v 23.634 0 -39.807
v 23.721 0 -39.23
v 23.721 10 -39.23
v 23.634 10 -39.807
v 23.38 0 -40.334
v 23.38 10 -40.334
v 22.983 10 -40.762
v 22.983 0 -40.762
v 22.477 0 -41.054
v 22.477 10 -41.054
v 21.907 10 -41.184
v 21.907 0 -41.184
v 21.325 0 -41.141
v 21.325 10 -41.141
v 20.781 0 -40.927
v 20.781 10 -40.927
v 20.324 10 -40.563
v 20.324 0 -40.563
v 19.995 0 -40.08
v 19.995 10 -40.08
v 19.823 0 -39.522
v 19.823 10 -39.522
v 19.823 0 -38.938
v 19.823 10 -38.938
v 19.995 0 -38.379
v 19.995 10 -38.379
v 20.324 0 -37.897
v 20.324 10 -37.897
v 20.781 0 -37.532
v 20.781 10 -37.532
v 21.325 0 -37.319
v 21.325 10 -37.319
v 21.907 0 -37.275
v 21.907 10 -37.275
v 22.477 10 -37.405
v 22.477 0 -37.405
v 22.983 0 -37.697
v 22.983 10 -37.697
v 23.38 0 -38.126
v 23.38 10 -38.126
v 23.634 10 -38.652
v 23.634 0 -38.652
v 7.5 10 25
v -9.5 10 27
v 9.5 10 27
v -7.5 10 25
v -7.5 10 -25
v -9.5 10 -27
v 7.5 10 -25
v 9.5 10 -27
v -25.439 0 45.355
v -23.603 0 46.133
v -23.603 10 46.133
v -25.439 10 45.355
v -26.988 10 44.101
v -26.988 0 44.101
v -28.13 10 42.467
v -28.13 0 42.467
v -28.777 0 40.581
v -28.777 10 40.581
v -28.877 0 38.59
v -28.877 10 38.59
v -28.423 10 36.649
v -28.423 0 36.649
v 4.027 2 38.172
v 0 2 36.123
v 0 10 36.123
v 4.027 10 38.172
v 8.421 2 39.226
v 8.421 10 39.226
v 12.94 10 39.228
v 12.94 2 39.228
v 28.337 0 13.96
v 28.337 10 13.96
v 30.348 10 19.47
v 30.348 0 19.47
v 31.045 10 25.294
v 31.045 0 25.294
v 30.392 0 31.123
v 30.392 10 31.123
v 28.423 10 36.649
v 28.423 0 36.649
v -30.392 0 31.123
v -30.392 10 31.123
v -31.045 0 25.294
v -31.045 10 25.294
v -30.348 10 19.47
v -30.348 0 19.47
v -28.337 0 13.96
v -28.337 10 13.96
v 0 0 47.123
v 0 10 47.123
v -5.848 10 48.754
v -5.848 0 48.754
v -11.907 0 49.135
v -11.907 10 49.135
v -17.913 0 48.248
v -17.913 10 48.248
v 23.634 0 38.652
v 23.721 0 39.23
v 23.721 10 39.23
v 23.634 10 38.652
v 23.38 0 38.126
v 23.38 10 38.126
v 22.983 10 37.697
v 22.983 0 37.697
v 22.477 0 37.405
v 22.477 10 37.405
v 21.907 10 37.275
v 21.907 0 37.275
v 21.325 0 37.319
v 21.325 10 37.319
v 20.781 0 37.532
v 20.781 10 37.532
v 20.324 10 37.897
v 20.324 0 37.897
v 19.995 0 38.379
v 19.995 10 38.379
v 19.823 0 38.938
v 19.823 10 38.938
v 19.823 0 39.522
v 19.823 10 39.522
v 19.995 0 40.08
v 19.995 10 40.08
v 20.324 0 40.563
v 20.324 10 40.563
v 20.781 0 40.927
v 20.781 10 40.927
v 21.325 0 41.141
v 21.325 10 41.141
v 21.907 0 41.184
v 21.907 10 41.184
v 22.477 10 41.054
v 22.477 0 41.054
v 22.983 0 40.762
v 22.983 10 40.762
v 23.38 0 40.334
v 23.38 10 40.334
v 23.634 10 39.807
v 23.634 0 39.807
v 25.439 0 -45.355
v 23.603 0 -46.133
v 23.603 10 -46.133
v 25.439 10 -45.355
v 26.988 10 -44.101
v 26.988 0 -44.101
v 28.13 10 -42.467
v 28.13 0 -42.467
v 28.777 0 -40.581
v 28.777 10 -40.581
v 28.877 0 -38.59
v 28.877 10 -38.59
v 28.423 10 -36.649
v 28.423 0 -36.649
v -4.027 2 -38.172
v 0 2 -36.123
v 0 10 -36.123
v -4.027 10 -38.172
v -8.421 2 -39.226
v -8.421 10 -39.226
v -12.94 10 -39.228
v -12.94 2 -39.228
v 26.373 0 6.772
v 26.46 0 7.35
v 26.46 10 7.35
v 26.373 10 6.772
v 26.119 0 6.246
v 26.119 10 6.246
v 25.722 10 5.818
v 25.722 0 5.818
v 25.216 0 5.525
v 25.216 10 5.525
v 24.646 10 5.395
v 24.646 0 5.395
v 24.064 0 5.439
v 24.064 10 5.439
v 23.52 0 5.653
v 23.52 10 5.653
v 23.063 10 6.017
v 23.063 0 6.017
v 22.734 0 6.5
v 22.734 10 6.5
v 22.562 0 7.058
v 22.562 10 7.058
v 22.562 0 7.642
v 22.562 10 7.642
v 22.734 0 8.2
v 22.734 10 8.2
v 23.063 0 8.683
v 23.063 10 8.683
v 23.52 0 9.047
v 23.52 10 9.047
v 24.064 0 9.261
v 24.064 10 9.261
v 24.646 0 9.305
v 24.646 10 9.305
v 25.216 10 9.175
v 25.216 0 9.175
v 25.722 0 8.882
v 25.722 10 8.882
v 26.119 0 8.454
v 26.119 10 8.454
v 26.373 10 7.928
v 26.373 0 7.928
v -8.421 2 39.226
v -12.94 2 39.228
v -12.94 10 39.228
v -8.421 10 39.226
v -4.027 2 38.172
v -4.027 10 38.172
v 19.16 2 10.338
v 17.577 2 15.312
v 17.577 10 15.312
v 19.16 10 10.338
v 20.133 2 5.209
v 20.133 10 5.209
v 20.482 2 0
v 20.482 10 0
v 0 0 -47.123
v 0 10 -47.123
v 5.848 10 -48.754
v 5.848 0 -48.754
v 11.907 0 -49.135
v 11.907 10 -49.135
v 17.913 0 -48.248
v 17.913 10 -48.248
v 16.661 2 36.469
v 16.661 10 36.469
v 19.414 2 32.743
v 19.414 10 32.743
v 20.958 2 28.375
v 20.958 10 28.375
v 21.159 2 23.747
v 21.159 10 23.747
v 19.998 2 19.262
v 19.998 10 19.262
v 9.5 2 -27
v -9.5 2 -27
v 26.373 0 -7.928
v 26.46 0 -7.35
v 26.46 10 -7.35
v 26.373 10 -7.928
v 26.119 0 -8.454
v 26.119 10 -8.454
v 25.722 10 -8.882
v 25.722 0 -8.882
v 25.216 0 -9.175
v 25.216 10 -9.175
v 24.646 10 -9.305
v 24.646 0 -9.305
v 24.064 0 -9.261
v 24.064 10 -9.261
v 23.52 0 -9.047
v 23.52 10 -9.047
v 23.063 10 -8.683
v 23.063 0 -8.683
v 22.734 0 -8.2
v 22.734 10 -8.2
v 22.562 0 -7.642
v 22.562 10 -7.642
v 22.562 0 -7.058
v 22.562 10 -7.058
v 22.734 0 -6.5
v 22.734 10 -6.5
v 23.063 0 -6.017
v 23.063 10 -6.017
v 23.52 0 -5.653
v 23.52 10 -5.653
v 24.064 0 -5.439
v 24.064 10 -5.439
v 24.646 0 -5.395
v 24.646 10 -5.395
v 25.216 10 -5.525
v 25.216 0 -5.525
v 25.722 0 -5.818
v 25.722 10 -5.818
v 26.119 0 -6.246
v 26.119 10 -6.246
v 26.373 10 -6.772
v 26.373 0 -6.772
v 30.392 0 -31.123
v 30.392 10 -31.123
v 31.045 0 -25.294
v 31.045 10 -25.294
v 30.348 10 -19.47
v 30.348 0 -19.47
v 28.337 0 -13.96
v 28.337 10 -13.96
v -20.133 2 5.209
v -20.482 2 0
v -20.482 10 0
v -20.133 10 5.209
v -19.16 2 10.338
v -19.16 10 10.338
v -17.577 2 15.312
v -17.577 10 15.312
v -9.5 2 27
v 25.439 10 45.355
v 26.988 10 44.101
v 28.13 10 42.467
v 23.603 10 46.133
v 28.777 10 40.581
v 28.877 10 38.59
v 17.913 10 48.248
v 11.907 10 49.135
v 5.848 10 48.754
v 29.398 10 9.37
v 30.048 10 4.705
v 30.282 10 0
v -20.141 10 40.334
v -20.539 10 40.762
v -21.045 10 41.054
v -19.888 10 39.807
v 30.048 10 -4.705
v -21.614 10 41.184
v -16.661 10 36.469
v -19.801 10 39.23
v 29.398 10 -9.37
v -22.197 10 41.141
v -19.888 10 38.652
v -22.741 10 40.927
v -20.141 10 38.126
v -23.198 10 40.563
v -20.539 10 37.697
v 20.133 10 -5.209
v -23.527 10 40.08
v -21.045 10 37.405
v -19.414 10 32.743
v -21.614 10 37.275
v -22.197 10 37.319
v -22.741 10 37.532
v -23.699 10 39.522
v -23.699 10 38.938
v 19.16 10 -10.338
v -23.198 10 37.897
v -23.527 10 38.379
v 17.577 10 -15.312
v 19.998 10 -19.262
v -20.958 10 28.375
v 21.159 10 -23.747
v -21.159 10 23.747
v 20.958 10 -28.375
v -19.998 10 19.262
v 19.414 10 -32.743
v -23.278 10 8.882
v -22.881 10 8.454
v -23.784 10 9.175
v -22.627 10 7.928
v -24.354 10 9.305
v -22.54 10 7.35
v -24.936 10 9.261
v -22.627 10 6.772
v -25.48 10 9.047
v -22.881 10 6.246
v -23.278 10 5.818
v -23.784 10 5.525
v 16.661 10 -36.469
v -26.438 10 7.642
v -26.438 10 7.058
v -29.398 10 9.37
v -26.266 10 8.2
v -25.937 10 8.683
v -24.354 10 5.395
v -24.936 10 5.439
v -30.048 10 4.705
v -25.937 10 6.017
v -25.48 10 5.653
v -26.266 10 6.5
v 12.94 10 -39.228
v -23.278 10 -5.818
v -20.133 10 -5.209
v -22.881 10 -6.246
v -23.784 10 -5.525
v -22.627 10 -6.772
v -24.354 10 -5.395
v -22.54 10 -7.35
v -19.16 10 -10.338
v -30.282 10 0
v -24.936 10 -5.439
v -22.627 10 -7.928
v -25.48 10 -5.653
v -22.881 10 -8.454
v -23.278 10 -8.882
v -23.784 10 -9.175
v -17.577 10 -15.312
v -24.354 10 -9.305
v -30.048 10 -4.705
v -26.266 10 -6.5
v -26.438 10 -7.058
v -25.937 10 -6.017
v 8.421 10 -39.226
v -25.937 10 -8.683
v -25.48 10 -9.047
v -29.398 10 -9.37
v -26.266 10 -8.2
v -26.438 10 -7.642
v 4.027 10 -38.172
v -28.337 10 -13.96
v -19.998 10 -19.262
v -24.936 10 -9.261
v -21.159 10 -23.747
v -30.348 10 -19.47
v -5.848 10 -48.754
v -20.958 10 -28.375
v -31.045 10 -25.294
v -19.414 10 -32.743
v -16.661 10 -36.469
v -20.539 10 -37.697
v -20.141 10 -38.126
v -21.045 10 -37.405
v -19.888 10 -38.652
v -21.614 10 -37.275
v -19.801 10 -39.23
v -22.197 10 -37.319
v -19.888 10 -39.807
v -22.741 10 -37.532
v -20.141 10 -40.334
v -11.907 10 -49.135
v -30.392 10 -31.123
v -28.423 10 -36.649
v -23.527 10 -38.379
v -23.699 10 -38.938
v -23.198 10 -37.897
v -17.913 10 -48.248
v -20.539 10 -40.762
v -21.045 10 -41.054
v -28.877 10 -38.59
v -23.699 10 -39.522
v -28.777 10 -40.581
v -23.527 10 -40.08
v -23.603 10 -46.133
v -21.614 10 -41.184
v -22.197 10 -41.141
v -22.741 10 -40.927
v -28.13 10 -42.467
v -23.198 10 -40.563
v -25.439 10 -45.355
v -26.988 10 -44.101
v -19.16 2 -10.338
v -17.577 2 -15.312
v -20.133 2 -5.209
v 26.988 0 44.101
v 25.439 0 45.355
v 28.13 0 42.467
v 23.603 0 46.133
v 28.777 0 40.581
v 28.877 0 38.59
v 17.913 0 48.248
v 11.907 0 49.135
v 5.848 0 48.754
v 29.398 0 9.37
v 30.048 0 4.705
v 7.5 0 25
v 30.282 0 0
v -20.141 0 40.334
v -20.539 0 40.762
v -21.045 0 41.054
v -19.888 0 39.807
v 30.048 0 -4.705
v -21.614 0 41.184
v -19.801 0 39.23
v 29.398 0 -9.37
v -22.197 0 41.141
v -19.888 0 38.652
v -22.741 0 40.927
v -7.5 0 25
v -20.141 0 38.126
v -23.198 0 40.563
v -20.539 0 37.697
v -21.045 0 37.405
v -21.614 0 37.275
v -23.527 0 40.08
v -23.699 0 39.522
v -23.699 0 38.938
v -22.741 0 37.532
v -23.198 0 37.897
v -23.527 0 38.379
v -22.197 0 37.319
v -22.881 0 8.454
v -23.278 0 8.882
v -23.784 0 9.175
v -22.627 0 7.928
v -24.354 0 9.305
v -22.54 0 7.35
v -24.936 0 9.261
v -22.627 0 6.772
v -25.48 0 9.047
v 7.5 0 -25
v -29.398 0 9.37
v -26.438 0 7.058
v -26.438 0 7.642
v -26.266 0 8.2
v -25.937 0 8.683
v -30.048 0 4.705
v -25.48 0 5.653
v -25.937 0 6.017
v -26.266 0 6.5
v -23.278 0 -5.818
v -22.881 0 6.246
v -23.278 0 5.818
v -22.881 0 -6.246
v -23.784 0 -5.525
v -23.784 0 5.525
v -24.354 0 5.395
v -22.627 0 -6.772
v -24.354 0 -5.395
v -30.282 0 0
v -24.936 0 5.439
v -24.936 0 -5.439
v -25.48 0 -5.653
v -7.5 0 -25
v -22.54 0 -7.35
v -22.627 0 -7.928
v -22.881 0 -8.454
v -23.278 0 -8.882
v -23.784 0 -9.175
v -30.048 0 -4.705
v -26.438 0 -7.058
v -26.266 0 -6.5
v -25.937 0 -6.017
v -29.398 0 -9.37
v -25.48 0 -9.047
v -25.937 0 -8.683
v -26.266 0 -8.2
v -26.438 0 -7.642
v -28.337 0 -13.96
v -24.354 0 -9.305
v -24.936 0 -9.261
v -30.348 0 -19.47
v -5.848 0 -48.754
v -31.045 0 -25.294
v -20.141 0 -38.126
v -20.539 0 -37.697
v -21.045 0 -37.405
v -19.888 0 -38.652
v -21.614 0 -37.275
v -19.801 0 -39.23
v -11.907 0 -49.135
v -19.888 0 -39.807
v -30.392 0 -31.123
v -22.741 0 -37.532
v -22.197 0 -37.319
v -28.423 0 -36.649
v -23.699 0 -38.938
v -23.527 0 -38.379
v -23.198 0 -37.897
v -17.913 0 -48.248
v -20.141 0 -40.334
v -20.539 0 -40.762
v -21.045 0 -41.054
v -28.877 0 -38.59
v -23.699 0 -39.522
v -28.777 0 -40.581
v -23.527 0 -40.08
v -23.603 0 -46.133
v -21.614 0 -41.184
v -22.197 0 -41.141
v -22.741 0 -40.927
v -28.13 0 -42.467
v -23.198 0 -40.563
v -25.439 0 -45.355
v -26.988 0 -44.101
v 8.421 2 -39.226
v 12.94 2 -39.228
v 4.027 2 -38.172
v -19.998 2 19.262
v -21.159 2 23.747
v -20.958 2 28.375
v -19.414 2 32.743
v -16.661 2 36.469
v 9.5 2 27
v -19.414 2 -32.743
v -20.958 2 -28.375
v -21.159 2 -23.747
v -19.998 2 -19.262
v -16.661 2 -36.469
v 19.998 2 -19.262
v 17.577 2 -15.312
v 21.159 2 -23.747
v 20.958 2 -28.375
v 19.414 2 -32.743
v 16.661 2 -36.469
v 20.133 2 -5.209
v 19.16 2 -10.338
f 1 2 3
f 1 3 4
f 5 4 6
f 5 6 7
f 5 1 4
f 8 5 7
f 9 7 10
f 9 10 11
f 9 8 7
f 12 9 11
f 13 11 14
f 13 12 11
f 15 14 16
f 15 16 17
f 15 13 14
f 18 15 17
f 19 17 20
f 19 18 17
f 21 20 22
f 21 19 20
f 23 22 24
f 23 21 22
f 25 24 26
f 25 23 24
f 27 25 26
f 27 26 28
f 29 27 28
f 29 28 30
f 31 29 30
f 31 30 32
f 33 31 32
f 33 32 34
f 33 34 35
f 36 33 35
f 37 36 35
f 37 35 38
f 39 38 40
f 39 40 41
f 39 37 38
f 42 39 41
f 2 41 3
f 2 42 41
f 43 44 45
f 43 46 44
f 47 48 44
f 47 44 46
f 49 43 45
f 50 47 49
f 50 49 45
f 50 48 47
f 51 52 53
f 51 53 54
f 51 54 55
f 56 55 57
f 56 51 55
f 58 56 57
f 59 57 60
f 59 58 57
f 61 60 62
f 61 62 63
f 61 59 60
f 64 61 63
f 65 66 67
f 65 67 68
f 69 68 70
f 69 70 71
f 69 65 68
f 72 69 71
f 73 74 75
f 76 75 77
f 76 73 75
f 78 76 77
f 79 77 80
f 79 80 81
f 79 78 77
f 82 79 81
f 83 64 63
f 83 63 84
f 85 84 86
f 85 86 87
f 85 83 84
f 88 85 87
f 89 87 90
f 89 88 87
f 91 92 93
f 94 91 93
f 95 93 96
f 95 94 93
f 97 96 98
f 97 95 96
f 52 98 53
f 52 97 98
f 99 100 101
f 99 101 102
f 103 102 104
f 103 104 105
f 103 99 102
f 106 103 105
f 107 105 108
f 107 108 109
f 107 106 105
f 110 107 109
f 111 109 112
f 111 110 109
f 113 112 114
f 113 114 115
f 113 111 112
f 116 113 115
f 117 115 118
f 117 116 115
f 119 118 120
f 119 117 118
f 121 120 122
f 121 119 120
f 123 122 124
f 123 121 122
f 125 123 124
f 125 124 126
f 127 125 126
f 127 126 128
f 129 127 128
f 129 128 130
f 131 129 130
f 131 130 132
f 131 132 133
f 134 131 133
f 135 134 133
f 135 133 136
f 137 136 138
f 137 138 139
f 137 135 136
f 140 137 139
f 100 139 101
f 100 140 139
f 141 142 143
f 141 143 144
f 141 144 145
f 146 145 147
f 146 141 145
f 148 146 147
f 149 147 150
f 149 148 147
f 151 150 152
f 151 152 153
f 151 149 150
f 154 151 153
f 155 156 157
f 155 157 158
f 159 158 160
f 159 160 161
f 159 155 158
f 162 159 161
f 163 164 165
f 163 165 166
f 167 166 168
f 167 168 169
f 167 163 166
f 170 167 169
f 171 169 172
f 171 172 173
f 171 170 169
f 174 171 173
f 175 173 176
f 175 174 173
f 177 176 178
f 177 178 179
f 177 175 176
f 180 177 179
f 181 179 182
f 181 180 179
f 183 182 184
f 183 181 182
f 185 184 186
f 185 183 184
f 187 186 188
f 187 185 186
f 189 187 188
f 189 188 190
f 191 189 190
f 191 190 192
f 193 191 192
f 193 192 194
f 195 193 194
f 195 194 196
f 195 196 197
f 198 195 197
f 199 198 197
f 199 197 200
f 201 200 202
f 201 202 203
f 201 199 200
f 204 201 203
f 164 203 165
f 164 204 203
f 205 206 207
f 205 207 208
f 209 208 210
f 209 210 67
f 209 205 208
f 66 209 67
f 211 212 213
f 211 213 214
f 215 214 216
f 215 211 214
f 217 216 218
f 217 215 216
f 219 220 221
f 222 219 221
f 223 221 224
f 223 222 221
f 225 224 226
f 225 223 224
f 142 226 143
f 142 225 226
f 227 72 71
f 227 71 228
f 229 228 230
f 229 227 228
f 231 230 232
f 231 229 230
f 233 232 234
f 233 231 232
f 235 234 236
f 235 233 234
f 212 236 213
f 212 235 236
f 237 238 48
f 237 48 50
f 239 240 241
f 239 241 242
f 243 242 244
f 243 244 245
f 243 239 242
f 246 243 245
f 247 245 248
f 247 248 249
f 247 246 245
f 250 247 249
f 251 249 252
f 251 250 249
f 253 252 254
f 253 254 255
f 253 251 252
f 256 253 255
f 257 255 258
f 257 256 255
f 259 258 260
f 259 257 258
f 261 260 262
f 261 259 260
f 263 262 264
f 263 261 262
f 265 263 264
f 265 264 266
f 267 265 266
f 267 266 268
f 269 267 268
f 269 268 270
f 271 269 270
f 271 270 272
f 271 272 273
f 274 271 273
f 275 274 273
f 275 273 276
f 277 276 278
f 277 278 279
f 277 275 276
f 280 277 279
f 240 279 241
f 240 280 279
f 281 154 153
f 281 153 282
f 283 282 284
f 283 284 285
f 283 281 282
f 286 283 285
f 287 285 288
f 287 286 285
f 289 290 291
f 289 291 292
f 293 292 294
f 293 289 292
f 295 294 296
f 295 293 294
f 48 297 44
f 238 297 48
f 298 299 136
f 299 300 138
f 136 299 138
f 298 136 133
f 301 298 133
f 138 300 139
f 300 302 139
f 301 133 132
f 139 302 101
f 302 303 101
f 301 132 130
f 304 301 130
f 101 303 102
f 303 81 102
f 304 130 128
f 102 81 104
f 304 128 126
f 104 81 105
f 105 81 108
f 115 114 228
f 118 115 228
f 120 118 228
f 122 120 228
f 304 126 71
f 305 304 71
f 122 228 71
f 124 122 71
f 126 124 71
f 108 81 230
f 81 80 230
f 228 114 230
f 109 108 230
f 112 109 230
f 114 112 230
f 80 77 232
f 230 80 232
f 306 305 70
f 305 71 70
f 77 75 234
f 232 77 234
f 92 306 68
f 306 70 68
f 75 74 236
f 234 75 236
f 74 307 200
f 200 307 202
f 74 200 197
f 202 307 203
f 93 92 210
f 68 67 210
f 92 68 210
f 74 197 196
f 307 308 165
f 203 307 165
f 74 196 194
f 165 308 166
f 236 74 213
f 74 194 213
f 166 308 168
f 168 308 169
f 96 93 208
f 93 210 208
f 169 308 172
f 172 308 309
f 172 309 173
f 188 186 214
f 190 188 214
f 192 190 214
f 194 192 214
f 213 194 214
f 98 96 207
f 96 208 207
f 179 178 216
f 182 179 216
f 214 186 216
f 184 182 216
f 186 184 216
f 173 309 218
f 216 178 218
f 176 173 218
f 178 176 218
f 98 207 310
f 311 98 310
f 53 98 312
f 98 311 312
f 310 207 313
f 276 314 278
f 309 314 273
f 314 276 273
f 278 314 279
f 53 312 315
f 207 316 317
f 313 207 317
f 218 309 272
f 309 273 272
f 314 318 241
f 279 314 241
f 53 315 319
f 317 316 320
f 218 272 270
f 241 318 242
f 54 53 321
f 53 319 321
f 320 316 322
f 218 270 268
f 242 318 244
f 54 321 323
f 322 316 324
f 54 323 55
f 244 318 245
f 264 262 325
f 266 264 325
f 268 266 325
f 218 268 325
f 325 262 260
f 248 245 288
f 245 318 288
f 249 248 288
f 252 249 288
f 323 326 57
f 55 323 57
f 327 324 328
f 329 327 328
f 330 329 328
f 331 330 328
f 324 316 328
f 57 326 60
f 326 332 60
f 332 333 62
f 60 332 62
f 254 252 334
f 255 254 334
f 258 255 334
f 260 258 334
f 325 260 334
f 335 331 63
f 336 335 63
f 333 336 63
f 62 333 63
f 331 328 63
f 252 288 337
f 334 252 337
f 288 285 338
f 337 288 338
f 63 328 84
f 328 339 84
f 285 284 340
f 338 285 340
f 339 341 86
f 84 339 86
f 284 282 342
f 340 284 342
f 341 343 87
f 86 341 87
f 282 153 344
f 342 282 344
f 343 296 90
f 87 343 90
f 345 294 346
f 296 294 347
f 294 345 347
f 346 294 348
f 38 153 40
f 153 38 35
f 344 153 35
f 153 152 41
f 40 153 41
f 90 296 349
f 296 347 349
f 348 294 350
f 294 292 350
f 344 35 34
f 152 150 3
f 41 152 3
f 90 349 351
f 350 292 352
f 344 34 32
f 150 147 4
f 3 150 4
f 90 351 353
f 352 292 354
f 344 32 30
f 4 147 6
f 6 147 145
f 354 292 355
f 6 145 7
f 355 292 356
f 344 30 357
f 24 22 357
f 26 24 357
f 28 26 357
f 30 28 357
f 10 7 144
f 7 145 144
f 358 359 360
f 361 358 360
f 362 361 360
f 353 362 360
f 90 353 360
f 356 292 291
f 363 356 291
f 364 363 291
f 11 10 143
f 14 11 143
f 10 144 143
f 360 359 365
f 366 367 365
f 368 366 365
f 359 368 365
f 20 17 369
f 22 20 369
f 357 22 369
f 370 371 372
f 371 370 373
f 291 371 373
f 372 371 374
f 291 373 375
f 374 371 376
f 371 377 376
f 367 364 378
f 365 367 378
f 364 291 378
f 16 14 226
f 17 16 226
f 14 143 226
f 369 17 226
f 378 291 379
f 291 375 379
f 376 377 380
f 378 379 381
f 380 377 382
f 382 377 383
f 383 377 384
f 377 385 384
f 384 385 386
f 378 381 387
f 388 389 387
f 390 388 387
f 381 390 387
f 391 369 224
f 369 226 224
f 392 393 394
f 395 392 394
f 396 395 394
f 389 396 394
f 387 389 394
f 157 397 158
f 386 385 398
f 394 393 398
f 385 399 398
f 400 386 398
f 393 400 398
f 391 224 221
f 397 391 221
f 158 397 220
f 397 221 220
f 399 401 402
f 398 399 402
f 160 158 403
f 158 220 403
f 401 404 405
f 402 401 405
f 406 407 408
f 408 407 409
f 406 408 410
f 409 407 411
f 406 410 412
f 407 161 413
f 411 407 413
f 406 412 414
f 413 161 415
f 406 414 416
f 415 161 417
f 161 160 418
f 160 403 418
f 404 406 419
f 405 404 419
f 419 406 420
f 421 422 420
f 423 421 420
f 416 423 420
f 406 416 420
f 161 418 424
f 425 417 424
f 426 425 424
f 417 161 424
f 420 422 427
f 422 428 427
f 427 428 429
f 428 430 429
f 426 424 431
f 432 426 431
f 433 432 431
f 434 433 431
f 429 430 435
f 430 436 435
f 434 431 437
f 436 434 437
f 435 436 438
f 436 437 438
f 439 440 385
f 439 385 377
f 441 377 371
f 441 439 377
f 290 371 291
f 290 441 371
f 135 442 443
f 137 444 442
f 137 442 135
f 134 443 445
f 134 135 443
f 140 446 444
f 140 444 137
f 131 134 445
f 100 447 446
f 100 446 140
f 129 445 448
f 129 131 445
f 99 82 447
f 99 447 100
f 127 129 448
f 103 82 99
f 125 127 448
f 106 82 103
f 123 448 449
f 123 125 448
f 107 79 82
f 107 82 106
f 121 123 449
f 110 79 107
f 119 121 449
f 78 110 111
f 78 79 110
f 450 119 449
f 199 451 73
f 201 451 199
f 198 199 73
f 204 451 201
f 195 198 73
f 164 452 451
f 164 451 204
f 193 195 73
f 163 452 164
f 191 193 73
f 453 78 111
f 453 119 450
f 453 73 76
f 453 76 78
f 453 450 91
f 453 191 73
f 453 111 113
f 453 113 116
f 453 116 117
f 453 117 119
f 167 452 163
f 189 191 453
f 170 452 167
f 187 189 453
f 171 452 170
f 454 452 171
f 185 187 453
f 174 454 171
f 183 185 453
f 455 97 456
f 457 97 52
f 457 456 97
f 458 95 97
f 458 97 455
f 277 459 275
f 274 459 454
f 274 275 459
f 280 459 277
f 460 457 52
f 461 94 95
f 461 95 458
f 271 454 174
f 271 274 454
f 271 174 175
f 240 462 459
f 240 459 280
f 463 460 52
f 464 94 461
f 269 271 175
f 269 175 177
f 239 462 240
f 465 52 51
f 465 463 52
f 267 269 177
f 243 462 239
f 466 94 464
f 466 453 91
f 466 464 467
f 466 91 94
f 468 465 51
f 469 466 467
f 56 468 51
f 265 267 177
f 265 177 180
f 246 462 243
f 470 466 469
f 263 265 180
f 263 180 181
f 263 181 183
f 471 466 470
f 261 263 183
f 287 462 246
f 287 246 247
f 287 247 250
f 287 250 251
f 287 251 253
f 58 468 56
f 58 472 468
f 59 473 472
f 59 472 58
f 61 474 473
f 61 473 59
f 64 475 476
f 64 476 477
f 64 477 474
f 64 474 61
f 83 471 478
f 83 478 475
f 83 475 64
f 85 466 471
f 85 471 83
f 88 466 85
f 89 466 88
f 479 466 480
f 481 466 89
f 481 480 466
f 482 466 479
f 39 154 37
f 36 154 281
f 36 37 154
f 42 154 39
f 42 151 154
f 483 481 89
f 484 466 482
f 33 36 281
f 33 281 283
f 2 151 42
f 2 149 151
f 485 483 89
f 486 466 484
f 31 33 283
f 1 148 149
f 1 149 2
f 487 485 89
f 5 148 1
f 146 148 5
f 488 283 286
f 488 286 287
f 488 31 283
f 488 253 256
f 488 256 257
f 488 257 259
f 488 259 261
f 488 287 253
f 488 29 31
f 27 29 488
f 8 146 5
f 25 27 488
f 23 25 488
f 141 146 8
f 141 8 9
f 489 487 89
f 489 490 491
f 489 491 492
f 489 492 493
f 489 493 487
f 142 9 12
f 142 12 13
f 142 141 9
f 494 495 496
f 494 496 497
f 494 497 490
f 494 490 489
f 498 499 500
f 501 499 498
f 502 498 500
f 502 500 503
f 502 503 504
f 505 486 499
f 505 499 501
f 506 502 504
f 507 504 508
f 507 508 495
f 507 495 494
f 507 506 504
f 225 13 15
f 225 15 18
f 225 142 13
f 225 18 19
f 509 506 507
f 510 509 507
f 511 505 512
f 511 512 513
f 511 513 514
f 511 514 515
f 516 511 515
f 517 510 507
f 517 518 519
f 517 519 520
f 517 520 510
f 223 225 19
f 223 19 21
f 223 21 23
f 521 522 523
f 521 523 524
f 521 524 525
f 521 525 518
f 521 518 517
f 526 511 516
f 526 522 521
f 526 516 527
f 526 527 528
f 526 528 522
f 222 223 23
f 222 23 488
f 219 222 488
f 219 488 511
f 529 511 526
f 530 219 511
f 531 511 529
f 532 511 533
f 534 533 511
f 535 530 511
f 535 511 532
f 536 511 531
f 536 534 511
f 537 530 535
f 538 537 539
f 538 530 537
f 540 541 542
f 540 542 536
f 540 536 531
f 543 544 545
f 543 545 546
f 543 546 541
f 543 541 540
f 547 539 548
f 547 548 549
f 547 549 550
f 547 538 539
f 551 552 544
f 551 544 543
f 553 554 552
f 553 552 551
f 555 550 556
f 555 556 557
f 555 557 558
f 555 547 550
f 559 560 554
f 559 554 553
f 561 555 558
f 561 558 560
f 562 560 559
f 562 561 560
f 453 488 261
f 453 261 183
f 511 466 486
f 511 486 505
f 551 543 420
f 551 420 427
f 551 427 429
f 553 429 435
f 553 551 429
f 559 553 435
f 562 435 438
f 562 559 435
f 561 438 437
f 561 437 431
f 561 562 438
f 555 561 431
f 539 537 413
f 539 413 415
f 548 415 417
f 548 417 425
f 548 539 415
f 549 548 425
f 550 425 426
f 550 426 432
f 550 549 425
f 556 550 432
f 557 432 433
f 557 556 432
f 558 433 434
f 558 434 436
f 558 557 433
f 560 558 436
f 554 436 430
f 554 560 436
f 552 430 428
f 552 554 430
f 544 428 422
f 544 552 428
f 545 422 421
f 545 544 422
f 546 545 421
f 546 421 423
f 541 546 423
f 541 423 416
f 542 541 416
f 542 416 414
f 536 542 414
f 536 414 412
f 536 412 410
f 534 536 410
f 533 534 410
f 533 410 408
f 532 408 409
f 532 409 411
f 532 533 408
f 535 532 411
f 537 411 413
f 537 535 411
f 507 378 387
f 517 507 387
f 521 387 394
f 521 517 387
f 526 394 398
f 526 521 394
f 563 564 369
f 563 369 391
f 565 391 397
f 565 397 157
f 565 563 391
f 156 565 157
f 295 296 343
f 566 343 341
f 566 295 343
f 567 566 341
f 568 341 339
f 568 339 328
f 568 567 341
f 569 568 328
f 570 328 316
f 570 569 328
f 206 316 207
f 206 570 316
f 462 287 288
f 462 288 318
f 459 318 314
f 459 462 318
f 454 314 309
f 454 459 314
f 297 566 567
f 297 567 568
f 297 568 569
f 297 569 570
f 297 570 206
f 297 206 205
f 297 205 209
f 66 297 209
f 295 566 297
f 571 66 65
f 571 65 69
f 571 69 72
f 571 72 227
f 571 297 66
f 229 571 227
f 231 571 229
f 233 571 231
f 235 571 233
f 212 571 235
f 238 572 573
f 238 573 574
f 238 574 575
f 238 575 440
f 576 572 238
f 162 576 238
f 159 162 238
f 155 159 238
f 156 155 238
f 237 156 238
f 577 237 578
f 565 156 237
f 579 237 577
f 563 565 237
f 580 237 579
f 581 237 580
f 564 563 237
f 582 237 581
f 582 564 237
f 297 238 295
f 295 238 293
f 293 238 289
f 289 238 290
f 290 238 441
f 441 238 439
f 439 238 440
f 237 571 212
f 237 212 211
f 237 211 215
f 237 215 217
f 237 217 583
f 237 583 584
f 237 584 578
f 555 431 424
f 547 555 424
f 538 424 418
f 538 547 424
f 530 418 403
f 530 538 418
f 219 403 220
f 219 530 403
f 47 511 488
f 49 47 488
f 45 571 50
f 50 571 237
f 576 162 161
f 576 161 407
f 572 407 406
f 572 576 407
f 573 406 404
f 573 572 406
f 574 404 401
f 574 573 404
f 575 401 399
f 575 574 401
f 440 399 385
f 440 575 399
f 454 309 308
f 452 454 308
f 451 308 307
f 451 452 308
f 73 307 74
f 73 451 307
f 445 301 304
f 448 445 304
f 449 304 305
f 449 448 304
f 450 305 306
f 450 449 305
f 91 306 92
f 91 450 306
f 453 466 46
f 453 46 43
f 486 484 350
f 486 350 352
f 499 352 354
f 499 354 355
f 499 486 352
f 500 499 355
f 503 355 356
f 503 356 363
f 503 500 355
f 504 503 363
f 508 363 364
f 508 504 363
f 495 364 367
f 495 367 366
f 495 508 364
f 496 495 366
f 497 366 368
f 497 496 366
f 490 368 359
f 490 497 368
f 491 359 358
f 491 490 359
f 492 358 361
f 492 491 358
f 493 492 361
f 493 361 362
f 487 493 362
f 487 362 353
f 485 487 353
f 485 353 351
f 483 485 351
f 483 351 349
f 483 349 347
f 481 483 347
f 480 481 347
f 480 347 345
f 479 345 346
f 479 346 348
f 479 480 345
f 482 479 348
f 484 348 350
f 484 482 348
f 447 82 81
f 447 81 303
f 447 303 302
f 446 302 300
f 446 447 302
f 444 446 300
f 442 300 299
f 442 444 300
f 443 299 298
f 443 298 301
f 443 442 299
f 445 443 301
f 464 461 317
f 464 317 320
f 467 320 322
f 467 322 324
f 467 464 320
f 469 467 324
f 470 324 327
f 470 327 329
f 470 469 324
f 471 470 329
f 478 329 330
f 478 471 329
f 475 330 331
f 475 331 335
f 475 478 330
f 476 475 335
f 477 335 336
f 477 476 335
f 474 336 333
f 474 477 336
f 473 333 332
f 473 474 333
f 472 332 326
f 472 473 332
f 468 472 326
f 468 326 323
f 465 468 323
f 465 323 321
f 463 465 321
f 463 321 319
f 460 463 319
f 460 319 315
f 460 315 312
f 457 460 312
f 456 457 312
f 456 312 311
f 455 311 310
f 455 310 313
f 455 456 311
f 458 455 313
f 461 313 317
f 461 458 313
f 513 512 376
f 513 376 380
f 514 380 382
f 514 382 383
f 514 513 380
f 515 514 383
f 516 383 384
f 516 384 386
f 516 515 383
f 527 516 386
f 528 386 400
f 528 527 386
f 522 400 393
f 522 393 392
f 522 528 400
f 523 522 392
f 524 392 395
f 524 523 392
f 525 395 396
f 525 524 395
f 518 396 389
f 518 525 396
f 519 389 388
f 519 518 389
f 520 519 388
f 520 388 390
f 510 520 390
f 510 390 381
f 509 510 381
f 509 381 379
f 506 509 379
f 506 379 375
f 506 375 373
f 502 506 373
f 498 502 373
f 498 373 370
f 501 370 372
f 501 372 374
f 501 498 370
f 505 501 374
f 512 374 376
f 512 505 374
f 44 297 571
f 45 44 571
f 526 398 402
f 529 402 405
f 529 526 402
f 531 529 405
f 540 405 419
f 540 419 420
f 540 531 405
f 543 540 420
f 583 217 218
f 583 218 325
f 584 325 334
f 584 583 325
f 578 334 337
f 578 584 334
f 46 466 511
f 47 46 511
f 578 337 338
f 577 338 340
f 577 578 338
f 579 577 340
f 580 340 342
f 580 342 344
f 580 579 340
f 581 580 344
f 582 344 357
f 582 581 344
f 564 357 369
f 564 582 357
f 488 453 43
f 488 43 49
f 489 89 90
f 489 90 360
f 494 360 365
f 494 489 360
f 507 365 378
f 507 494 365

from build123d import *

# Parameters (mm, degrees)
SKETCH1_W           = 19
SKETCH1_H           = 54
BOSS_EXTRUDE4_DEPTH = 2
SKETCH1_8_R         = 1.96
SKETCH1_8_W         = 19
SKETCH1_8_H         = 54
SKETCH1_8_W_2       = 15
SKETCH1_8_H_2       = 50
BOSS_EXTRUDE7_DEPTH = 10


with BuildPart() as part:
    # Sketch1 → Boss-Extrude4 (new body)
    with BuildSketch(Plane(origin=(0, 0, 0), x_dir=(1, 0, 0), z_dir=(0, 1, 0))):
        with BuildLine():
            ThreePointArc((0, 36.123062219), (-6.193274653, 38.828364827), (-12.939793146, 39.228116436))
            ThreePointArc((-12.939793146, 39.228116436), (-20.958488329, 28.375411428), (-17.576524537, 15.31237199))
            ThreePointArc((-17.576524537, 15.31237199), (-19.723741965, 7.787946982), (-20.482290695, 0))
            ThreePointArc((-20.482290695, 0), (-19.723741965, -7.787946982), (-17.576524537, -15.31237199))
            ThreePointArc((-17.576524537, -15.31237199), (-20.958488329, -28.375411428), (-12.939793146, -39.228116436))
            ThreePointArc((-12.939793146, -39.228116436), (-6.193274653, -38.828364827), (0, -36.123062219))
            ThreePointArc((0, -36.123062219), (6.193274653, -38.828364827), (12.939793146, -39.228116436))
            ThreePointArc((12.939793146, -39.228116436), (20.958488329, -28.375411428), (17.576524537, -15.31237199))
            ThreePointArc((17.576524537, -15.31237199), (19.723741965, -7.787946982), (20.482290695, 0))
            ThreePointArc((20.482290695, 0), (19.723741965, 7.787946982), (17.576524537, 15.31237199))
            ThreePointArc((17.576524537, 15.31237199), (20.958488329, 28.375411428), (12.939793146, 39.228116436))
            ThreePointArc((12.939793146, 39.228116436), (6.193274653, 38.828364827), (0, 36.123062219))
        make_face()
        Rectangle(SKETCH1_W, SKETCH1_H, mode=Mode.SUBTRACT)
    extrude(amount=BOSS_EXTRUDE4_DEPTH)

    # Sketch1<8> → Boss-Extrude7 (add)
    # profile 1 of 2: a face of its own
    with BuildSketch(Plane(origin=(0, 0, 0), x_dir=(1, 0, 0), z_dir=(0, 1, 0))):
        with BuildLine():
            ThreePointArc((23.603104913, 46.133139939), (11.906709568, 49.134588213), (0, 47.123463385))
            ThreePointArc((0, 47.123463385), (-11.906709568, 49.134588213), (-23.603104913, 46.133139939))
            ThreePointArc((-23.603104913, 46.133139939), (-28.130450168, 42.466846104), (-28.423306673, 36.648530145))
            ThreePointArc((-28.423306673, 36.648530145), (-31.044925166, 25.293928807), (-28.336730948, 13.959664864))
            ThreePointArc((-28.336730948, 13.959664864), (-29.774673681, 7.044655791), (-30.282467524, 0))
            ThreePointArc((-30.282467524, 0), (-29.774673681, -7.044655791), (-28.336730948, -13.959664864))
            ThreePointArc((-28.336730948, -13.959664864), (-31.044925166, -25.293928807), (-28.423306673, -36.648530145))
            ThreePointArc((-28.423306673, -36.648530145), (-28.130450168, -42.466846104), (-23.603104913, -46.133139939))
            ThreePointArc((-23.603104913, -46.133139939), (-11.906709568, -49.134588213), (0, -47.123463385))
            ThreePointArc((0, -47.123463385), (11.906709568, -49.134588213), (23.603104913, -46.133139939))
            ThreePointArc((23.603104913, -46.133139939), (28.130450168, -42.466846104), (28.423306673, -36.648530145))
            ThreePointArc((28.423306673, -36.648530145), (31.044925166, -25.293928807), (28.336730948, -13.959664864))
            ThreePointArc((28.336730948, -13.959664864), (29.774673681, -7.044655791), (30.282467524, 0))
            ThreePointArc((30.282467524, 0), (29.774673681, 7.044655791), (28.336730948, 13.959664864))
            ThreePointArc((28.336730948, 13.959664864), (31.044925166, 25.293928807), (28.423306673, 36.648530145))
            ThreePointArc((28.423306673, 36.648530145), (28.130450168, 42.466846104), (23.603104913, 46.133139939))
        make_face()
        with Locations((-21.760807675, -39.229711143)):
            Circle(SKETCH1_8_R, mode=Mode.SUBTRACT)
        with Locations((-24.5, -7.35)):
            Circle(SKETCH1_8_R, mode=Mode.SUBTRACT)
        with BuildLine():
            ThreePointArc((-17.576524537, 15.31237199), (-20.958488329, 28.375411428), (-12.939793146, 39.228116436))
            ThreePointArc((-12.939793146, 39.228116436), (-6.193274653, 38.828364827), (0, 36.123062219))
            ThreePointArc((0, 36.123062219), (6.193274653, 38.828364827), (12.939793146, 39.228116436))
            ThreePointArc((12.939793146, 39.228116436), (20.958488329, 28.375411428), (17.576524537, 15.31237199))
            ThreePointArc((17.576524537, 15.31237199), (19.723741965, 7.787946982), (20.482290695, 0))
            ThreePointArc((20.482290695, 0), (19.723741965, -7.787946982), (17.576524537, -15.31237199))
            ThreePointArc((17.576524537, -15.31237199), (20.958488329, -28.375411428), (12.939793146, -39.228116436))
            ThreePointArc((12.939793146, -39.228116436), (6.193274653, -38.828364827), (0, -36.123062219))
            ThreePointArc((0, -36.123062219), (-6.193274653, -38.828364827), (-12.939793146, -39.228116436))
            ThreePointArc((-12.939793146, -39.228116436), (-20.958488329, -28.375411428), (-17.576524537, -15.31237199))
            ThreePointArc((-17.576524537, -15.31237199), (-19.723741965, -7.787946982), (-20.482290695, 0))
            ThreePointArc((-20.482290695, 0), (-19.723741965, 7.787946982), (-17.576524537, 15.31237199))
        make_face(mode=Mode.SUBTRACT)
        with Locations((21.760807675, -39.229711143)):
            Circle(SKETCH1_8_R, mode=Mode.SUBTRACT)
        with Locations((24.5, -7.35)):
            Circle(SKETCH1_8_R, mode=Mode.SUBTRACT)
        with Locations((-24.5, 7.35)):
            Circle(SKETCH1_8_R, mode=Mode.SUBTRACT)
        with Locations((-21.760807675, 39.229711143)):
            Circle(SKETCH1_8_R, mode=Mode.SUBTRACT)
        with Locations((24.5, 7.35)):
            Circle(SKETCH1_8_R, mode=Mode.SUBTRACT)
        with Locations((21.760807675, 39.229711143)):
            Circle(SKETCH1_8_R, mode=Mode.SUBTRACT)
    # profile 2 of 2: a face of its own
    with BuildSketch(Plane(origin=(0, 0, 0), x_dir=(1, 0, 0), z_dir=(0, 1, 0))):
        Rectangle(SKETCH1_8_W, SKETCH1_8_H)
        Rectangle(SKETCH1_8_W_2, SKETCH1_8_H_2, mode=Mode.SUBTRACT)
    extrude(amount=BOSS_EXTRUDE7_DEPTH)


solid = part.part
